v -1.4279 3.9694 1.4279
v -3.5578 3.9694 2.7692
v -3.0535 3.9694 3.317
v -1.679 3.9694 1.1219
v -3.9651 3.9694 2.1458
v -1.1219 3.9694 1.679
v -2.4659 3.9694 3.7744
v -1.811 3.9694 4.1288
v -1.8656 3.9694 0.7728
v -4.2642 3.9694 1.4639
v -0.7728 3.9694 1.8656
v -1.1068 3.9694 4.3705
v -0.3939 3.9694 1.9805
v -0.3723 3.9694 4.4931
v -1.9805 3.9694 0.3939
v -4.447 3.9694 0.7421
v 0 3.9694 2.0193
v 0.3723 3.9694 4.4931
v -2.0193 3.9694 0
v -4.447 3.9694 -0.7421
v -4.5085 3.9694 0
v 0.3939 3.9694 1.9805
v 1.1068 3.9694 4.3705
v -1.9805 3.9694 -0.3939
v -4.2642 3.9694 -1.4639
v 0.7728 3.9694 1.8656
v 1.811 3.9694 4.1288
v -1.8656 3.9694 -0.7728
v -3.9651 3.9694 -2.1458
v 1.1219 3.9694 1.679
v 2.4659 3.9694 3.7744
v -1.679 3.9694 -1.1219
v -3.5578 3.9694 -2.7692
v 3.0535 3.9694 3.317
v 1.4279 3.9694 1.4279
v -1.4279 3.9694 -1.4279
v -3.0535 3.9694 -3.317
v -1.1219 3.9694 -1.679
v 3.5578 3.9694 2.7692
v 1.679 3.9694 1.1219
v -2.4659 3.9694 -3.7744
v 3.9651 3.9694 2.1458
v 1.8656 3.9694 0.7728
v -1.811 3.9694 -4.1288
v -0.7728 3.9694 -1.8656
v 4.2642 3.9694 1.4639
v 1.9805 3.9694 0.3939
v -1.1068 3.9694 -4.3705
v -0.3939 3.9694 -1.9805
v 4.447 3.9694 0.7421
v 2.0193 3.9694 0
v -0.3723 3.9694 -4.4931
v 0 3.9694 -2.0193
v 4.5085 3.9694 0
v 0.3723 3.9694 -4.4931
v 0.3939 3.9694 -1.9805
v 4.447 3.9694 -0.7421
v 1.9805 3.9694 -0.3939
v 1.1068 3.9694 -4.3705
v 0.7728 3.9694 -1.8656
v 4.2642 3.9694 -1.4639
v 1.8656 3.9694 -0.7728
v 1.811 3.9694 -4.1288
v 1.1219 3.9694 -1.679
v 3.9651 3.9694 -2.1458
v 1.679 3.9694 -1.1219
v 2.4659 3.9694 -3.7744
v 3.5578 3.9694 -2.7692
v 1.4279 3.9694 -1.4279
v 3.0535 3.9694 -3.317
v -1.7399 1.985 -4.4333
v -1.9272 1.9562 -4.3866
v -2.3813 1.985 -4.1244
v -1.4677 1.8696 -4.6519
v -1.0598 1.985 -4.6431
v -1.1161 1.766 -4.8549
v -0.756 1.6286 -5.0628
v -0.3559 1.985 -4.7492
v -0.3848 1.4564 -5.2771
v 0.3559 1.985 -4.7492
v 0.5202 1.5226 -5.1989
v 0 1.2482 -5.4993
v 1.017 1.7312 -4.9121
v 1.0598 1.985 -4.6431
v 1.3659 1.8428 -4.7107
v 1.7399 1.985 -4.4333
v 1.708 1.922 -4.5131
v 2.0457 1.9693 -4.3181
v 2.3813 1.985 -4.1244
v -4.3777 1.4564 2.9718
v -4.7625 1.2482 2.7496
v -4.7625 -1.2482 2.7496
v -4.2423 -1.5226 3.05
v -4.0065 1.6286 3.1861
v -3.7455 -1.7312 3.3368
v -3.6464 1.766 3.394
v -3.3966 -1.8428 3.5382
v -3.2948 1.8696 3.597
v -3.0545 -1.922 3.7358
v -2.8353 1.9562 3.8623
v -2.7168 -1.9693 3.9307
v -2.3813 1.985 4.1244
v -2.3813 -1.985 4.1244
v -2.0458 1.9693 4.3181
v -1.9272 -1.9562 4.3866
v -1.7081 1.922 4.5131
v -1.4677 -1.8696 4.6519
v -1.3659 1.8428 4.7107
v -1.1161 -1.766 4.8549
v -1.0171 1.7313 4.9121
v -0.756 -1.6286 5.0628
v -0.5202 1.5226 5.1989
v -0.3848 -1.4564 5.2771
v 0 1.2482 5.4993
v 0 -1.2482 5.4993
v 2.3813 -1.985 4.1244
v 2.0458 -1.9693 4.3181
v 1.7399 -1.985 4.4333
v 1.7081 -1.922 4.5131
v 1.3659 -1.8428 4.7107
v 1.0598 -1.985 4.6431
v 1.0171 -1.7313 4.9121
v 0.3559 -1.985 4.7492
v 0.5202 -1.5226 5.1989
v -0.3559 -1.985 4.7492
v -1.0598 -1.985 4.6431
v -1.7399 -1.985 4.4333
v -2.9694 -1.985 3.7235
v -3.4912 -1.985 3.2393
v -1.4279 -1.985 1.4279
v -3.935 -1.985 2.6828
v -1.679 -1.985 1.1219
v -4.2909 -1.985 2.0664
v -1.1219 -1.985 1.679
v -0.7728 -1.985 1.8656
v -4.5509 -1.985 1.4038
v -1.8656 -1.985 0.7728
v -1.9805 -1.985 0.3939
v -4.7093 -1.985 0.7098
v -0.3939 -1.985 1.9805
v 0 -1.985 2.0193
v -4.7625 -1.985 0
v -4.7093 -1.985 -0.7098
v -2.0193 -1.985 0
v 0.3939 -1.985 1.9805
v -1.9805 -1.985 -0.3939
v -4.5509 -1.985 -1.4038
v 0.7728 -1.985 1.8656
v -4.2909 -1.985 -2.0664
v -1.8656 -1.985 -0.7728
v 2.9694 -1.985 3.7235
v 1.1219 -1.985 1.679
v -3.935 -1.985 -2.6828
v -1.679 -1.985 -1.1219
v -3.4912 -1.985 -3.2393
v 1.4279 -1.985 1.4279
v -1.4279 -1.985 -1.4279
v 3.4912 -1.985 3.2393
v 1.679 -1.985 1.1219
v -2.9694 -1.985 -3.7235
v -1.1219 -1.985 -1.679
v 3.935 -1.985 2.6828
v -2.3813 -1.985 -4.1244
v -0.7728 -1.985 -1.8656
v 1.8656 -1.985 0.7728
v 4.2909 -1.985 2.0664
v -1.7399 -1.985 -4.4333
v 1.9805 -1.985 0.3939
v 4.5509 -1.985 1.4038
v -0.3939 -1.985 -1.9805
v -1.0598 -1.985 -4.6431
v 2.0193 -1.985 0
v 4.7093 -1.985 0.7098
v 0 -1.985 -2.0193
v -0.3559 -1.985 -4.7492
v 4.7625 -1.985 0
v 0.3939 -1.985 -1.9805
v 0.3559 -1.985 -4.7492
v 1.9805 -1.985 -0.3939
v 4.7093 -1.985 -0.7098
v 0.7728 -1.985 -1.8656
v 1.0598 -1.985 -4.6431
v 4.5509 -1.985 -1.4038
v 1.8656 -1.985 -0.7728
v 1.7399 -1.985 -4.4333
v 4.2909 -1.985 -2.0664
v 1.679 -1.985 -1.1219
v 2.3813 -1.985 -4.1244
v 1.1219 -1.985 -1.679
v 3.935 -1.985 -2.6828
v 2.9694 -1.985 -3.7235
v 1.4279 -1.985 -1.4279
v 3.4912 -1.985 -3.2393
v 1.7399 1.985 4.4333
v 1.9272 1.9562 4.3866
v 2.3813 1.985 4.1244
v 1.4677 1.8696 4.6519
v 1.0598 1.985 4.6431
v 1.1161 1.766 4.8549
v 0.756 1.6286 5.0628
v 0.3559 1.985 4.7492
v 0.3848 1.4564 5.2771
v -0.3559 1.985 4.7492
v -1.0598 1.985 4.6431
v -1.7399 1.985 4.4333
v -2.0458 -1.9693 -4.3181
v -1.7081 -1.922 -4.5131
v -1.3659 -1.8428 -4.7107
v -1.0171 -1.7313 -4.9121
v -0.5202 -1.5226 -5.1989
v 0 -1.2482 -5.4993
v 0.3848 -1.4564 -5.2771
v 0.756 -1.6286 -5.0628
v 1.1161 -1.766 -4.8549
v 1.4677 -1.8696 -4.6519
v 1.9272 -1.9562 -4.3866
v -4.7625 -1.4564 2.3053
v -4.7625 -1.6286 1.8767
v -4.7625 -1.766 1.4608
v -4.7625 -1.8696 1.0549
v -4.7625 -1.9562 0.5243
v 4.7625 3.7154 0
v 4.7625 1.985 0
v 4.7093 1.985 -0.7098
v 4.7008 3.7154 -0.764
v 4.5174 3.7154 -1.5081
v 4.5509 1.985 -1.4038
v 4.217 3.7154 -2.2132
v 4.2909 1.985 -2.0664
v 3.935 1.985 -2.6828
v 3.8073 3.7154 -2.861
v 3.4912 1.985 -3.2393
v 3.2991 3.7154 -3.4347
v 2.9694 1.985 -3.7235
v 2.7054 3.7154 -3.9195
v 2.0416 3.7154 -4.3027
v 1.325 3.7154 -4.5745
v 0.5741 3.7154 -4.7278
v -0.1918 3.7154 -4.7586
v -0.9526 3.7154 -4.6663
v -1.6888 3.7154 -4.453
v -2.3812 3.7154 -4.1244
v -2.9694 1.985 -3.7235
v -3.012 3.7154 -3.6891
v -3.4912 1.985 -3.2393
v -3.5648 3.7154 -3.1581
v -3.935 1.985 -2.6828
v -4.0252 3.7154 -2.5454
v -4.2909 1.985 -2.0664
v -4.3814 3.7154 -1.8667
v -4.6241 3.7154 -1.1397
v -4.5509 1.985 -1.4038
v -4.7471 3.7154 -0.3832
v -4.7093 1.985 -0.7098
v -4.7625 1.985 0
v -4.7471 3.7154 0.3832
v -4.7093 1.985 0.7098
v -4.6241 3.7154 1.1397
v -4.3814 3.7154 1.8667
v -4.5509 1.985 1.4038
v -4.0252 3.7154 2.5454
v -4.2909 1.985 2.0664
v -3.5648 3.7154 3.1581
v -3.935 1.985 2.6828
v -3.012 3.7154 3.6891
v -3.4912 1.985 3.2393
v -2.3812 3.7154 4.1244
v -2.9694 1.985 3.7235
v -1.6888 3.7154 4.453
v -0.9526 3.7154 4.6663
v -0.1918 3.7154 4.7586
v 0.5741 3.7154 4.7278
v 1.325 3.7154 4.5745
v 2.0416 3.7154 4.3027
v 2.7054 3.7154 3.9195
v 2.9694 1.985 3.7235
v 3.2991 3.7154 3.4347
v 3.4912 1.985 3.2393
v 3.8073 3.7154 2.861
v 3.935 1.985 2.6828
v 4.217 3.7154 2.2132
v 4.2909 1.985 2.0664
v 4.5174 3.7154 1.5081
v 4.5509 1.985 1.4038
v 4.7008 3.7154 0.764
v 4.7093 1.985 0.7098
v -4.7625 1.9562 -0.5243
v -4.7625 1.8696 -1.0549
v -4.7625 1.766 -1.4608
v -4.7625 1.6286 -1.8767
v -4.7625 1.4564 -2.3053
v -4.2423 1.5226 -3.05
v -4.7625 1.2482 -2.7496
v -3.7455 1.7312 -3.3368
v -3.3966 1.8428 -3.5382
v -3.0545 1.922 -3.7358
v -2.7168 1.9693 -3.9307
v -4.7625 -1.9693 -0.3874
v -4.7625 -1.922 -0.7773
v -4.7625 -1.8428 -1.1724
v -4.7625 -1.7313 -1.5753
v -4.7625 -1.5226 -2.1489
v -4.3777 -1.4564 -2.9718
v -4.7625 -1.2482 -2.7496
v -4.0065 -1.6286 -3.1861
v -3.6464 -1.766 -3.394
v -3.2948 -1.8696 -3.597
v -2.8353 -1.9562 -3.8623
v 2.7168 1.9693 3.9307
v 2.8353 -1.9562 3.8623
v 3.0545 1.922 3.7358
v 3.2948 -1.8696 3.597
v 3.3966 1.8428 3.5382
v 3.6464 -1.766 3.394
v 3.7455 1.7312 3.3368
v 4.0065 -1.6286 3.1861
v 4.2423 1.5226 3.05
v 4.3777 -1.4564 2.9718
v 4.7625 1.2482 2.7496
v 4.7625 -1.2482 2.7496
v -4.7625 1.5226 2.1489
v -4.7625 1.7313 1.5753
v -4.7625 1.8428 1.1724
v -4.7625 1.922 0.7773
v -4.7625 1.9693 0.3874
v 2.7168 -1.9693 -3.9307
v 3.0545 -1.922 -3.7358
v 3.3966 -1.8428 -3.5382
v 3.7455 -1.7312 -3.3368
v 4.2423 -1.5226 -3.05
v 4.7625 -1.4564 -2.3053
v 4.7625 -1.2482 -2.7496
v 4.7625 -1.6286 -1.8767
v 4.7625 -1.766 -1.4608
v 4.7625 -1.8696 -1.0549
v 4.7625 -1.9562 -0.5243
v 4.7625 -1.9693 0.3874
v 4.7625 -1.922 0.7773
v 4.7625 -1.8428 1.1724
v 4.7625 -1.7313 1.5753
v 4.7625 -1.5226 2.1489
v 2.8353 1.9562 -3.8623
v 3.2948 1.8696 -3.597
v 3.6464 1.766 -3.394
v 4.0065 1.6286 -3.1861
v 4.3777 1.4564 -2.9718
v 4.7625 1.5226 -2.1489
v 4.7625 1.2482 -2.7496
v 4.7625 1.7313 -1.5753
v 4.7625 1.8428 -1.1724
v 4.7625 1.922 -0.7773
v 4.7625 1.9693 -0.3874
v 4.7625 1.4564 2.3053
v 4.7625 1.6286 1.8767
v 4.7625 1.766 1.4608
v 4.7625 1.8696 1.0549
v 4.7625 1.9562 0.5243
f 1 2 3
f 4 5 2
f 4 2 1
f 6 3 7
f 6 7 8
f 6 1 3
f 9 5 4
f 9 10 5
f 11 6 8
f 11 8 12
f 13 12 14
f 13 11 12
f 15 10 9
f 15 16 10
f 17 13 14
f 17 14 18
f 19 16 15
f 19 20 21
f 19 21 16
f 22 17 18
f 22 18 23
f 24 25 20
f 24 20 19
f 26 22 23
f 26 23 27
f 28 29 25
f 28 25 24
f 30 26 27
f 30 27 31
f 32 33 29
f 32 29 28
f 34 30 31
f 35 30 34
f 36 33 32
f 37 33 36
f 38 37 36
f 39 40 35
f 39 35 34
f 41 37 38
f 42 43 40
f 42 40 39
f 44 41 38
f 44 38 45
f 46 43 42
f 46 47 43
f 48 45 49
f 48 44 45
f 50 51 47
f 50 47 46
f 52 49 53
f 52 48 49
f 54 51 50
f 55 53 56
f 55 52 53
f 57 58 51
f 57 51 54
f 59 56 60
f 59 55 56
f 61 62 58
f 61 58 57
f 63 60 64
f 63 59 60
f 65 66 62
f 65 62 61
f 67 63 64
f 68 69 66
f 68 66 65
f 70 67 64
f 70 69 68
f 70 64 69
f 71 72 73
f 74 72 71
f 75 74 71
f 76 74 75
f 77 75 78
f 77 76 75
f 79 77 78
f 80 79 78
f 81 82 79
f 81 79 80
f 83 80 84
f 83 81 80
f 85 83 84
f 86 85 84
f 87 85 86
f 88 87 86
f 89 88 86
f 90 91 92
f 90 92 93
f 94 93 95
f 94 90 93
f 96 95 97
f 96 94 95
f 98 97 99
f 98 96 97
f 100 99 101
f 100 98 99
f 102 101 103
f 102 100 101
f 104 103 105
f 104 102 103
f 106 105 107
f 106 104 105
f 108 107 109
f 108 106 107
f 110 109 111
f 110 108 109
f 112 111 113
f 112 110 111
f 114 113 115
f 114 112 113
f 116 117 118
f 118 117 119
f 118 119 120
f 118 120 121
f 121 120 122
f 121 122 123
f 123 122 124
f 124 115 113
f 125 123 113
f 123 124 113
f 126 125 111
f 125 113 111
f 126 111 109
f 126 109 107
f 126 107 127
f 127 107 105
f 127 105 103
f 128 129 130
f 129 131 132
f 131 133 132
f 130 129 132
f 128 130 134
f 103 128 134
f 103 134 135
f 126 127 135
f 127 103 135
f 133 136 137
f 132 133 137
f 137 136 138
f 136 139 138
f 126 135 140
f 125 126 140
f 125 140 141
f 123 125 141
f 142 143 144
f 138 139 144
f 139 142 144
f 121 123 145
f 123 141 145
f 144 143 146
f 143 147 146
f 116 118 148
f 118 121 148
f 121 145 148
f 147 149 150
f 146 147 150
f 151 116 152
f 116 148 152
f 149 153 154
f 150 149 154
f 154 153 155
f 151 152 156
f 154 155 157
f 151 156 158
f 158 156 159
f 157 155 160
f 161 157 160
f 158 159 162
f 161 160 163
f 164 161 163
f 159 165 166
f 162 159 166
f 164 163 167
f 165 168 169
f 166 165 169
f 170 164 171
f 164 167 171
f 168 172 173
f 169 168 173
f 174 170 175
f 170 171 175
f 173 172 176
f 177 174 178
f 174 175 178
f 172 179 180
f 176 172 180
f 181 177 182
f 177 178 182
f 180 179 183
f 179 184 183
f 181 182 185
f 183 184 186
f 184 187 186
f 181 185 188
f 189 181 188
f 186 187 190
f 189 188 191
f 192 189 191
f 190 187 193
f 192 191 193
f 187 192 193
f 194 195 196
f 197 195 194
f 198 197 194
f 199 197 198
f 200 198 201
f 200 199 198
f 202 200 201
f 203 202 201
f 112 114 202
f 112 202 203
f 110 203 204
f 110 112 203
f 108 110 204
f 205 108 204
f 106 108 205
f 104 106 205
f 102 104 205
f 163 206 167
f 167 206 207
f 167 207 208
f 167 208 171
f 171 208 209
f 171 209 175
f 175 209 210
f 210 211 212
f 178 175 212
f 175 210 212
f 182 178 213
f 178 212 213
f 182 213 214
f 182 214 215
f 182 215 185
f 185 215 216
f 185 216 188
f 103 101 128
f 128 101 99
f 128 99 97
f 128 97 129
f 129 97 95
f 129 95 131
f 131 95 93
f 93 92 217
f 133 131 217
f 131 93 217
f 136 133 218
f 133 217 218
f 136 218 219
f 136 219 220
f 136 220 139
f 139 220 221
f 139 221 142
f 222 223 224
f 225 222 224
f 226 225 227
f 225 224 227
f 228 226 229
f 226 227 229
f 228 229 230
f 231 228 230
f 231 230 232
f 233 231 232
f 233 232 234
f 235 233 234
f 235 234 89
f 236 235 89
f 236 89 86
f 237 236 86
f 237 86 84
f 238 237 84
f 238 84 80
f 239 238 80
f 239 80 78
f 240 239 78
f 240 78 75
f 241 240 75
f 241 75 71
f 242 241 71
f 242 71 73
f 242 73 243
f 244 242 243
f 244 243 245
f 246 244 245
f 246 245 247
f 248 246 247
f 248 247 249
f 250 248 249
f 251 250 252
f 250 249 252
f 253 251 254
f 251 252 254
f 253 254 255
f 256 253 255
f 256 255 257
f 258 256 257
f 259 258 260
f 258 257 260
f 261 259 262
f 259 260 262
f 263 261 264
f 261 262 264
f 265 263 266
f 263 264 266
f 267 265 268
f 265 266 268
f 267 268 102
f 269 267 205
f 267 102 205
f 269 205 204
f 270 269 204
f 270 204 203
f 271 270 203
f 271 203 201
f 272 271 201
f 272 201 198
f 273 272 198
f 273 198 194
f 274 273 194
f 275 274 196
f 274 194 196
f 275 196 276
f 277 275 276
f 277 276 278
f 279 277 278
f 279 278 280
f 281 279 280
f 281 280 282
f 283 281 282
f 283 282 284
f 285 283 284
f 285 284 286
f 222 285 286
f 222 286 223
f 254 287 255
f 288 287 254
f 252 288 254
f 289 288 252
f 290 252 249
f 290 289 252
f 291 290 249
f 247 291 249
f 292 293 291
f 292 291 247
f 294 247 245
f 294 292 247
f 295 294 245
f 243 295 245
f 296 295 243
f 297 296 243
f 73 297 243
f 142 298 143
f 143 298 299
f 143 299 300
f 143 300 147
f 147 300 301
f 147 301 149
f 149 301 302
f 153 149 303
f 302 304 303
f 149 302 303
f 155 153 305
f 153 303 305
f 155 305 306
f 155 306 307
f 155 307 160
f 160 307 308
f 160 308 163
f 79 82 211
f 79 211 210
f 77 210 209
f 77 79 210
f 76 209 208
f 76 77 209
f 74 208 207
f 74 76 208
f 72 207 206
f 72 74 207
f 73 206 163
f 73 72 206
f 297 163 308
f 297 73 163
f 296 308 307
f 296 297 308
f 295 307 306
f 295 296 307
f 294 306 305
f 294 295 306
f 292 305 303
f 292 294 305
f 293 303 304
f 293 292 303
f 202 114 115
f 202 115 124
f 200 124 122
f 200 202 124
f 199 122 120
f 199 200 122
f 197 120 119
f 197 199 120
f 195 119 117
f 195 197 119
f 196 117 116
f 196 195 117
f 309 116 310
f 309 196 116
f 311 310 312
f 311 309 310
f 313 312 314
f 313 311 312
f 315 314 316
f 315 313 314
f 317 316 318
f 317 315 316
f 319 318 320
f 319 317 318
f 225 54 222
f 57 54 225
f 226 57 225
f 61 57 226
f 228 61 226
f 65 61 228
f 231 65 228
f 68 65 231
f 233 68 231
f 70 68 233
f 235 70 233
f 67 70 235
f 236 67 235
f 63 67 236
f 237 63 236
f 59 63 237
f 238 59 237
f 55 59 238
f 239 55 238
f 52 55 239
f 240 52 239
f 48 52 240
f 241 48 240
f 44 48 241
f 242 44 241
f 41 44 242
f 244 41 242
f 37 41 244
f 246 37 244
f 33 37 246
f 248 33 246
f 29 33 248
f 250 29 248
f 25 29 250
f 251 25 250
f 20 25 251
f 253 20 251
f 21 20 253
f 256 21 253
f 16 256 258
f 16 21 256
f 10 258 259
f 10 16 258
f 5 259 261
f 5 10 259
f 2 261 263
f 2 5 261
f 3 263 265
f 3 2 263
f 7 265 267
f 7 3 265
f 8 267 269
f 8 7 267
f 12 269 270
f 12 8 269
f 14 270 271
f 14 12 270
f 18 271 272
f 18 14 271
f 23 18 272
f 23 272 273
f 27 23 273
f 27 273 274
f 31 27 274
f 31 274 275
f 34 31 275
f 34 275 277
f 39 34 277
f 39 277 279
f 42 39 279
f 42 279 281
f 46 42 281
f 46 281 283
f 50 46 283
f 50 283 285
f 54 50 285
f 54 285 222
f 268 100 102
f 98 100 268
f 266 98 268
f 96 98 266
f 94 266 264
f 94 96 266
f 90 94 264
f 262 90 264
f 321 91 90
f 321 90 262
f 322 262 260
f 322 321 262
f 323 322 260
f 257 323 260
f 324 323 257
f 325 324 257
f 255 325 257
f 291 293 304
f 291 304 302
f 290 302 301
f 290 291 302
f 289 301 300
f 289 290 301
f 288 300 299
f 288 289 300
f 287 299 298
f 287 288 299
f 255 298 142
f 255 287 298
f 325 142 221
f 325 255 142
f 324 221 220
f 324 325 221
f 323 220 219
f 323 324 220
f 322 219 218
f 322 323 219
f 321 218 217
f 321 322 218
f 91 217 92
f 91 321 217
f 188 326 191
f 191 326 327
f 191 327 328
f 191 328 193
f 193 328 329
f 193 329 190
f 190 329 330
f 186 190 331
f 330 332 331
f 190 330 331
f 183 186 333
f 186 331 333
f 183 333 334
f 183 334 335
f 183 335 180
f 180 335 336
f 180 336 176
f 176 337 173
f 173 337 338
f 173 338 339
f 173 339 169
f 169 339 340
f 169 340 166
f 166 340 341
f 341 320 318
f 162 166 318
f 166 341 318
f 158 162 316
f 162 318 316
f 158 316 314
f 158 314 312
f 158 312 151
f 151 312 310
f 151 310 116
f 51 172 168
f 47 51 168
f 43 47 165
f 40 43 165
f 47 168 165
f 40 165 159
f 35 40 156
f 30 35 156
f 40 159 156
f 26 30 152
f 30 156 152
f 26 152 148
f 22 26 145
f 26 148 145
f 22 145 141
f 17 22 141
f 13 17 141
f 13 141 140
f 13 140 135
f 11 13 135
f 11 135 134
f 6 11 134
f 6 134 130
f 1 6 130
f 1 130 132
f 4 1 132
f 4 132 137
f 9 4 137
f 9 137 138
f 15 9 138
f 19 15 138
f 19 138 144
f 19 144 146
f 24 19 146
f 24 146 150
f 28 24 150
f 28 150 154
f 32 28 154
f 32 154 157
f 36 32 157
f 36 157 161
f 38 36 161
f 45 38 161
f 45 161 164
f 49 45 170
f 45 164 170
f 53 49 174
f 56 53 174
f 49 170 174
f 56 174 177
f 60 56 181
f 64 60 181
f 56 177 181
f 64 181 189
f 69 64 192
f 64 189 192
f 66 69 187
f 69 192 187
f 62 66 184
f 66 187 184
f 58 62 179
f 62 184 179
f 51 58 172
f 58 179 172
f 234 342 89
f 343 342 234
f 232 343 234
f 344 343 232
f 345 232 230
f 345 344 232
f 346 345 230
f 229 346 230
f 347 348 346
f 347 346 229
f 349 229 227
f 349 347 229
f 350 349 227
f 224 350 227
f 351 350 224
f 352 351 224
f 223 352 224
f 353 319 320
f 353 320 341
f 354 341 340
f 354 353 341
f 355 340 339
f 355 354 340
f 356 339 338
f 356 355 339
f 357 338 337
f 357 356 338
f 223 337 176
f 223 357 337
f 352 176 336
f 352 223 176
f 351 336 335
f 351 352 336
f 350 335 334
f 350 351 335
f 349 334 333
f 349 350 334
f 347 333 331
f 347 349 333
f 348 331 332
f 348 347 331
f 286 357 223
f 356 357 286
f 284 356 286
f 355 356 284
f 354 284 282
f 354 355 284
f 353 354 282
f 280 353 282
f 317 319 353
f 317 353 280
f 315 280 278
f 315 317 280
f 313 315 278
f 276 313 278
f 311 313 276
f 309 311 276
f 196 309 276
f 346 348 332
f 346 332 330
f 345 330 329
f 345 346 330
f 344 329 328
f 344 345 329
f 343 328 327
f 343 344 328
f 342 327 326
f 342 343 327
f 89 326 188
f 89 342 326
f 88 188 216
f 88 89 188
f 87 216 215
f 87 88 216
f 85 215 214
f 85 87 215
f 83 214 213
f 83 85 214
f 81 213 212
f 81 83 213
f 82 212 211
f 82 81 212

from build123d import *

# Parameters (mm, degrees)
EXTRUDE1_DEPTH              = 1.98501
SKETCH2_OUTSIDE_W           = 22.481
SKETCH2_OUTSIDE_H           = 23.954
SKETCH2_OUTSIDE_R           = 4.7625
EXTRUDE3_DEPTH              = 3.97002
EXTRUDE3_TAPER              = 45
SKETCH3_R                   = 4.7625
EXTRUDE4_DEPTH              = 1.984375
F_21_0_159_DIAMETER_HOLE1_D = 4.0386
CHAMFER1_SIZE               = 0.254


with BuildPart() as part:
    # Sketch1 → Extrude1 (new body, symmetric)
    with BuildSketch(Plane(origin=(0, 0, 0), x_dir=(1, 0, 0), z_dir=(0, 1, 0))):
        Polygon((0, 5.499261314), (-4.7625, 2.749630657), (-4.7625, -2.749630657), (0, -5.499261314), (4.7625, -2.749630657), (4.7625, 2.749630657), align=None)
    extrude(amount=EXTRUDE1_DEPTH, both=True)

    # Sketch2 outside → Extrude3 (cut)
    with BuildSketch(Plane(origin=(0, 1.98501, 0), x_dir=(1, 0, 0), z_dir=(0, 1, 0))):
        with Locations((-0.0005, 0)):
            Rectangle(SKETCH2_OUTSIDE_W, SKETCH2_OUTSIDE_H)
        Circle(SKETCH2_OUTSIDE_R, mode=Mode.SUBTRACT)
    extrude3 = extrude(amount=-EXTRUDE3_DEPTH, taper=EXTRUDE3_TAPER, mode=Mode.SUBTRACT)

    # Mirror1: Extrude3 across plane
    add(extrude3.mirror(Plane.ZX), mode=Mode.SUBTRACT)

    # Sketch3 → Extrude4 (add)
    with BuildSketch(Plane(origin=(0, 1.98501, 0), x_dir=(1, 0, 0), z_dir=(0, 1, 0))):
        Circle(SKETCH3_R)
    extrude(amount=EXTRUDE4_DEPTH)

    # #21 (0.159) Diameter Hole1 (through all)
    with Locations(Plane(origin=(0, 3.969385, 0), x_dir=(-1, 0, 0), z_dir=(0, 1, 0))):
        with Locations((0, 0)):
            Hole(F_21_0_159_DIAMETER_HOLE1_D / 2)

    # Chamfer1
    chamfer1_edges = [part.edges().sort_by_distance(p)[0] for p in [
        (-4.7625, 3.969385, 0),
    ]]
    chamfer(chamfer1_edges, length=CHAMFER1_SIZE)


solid = part.part
